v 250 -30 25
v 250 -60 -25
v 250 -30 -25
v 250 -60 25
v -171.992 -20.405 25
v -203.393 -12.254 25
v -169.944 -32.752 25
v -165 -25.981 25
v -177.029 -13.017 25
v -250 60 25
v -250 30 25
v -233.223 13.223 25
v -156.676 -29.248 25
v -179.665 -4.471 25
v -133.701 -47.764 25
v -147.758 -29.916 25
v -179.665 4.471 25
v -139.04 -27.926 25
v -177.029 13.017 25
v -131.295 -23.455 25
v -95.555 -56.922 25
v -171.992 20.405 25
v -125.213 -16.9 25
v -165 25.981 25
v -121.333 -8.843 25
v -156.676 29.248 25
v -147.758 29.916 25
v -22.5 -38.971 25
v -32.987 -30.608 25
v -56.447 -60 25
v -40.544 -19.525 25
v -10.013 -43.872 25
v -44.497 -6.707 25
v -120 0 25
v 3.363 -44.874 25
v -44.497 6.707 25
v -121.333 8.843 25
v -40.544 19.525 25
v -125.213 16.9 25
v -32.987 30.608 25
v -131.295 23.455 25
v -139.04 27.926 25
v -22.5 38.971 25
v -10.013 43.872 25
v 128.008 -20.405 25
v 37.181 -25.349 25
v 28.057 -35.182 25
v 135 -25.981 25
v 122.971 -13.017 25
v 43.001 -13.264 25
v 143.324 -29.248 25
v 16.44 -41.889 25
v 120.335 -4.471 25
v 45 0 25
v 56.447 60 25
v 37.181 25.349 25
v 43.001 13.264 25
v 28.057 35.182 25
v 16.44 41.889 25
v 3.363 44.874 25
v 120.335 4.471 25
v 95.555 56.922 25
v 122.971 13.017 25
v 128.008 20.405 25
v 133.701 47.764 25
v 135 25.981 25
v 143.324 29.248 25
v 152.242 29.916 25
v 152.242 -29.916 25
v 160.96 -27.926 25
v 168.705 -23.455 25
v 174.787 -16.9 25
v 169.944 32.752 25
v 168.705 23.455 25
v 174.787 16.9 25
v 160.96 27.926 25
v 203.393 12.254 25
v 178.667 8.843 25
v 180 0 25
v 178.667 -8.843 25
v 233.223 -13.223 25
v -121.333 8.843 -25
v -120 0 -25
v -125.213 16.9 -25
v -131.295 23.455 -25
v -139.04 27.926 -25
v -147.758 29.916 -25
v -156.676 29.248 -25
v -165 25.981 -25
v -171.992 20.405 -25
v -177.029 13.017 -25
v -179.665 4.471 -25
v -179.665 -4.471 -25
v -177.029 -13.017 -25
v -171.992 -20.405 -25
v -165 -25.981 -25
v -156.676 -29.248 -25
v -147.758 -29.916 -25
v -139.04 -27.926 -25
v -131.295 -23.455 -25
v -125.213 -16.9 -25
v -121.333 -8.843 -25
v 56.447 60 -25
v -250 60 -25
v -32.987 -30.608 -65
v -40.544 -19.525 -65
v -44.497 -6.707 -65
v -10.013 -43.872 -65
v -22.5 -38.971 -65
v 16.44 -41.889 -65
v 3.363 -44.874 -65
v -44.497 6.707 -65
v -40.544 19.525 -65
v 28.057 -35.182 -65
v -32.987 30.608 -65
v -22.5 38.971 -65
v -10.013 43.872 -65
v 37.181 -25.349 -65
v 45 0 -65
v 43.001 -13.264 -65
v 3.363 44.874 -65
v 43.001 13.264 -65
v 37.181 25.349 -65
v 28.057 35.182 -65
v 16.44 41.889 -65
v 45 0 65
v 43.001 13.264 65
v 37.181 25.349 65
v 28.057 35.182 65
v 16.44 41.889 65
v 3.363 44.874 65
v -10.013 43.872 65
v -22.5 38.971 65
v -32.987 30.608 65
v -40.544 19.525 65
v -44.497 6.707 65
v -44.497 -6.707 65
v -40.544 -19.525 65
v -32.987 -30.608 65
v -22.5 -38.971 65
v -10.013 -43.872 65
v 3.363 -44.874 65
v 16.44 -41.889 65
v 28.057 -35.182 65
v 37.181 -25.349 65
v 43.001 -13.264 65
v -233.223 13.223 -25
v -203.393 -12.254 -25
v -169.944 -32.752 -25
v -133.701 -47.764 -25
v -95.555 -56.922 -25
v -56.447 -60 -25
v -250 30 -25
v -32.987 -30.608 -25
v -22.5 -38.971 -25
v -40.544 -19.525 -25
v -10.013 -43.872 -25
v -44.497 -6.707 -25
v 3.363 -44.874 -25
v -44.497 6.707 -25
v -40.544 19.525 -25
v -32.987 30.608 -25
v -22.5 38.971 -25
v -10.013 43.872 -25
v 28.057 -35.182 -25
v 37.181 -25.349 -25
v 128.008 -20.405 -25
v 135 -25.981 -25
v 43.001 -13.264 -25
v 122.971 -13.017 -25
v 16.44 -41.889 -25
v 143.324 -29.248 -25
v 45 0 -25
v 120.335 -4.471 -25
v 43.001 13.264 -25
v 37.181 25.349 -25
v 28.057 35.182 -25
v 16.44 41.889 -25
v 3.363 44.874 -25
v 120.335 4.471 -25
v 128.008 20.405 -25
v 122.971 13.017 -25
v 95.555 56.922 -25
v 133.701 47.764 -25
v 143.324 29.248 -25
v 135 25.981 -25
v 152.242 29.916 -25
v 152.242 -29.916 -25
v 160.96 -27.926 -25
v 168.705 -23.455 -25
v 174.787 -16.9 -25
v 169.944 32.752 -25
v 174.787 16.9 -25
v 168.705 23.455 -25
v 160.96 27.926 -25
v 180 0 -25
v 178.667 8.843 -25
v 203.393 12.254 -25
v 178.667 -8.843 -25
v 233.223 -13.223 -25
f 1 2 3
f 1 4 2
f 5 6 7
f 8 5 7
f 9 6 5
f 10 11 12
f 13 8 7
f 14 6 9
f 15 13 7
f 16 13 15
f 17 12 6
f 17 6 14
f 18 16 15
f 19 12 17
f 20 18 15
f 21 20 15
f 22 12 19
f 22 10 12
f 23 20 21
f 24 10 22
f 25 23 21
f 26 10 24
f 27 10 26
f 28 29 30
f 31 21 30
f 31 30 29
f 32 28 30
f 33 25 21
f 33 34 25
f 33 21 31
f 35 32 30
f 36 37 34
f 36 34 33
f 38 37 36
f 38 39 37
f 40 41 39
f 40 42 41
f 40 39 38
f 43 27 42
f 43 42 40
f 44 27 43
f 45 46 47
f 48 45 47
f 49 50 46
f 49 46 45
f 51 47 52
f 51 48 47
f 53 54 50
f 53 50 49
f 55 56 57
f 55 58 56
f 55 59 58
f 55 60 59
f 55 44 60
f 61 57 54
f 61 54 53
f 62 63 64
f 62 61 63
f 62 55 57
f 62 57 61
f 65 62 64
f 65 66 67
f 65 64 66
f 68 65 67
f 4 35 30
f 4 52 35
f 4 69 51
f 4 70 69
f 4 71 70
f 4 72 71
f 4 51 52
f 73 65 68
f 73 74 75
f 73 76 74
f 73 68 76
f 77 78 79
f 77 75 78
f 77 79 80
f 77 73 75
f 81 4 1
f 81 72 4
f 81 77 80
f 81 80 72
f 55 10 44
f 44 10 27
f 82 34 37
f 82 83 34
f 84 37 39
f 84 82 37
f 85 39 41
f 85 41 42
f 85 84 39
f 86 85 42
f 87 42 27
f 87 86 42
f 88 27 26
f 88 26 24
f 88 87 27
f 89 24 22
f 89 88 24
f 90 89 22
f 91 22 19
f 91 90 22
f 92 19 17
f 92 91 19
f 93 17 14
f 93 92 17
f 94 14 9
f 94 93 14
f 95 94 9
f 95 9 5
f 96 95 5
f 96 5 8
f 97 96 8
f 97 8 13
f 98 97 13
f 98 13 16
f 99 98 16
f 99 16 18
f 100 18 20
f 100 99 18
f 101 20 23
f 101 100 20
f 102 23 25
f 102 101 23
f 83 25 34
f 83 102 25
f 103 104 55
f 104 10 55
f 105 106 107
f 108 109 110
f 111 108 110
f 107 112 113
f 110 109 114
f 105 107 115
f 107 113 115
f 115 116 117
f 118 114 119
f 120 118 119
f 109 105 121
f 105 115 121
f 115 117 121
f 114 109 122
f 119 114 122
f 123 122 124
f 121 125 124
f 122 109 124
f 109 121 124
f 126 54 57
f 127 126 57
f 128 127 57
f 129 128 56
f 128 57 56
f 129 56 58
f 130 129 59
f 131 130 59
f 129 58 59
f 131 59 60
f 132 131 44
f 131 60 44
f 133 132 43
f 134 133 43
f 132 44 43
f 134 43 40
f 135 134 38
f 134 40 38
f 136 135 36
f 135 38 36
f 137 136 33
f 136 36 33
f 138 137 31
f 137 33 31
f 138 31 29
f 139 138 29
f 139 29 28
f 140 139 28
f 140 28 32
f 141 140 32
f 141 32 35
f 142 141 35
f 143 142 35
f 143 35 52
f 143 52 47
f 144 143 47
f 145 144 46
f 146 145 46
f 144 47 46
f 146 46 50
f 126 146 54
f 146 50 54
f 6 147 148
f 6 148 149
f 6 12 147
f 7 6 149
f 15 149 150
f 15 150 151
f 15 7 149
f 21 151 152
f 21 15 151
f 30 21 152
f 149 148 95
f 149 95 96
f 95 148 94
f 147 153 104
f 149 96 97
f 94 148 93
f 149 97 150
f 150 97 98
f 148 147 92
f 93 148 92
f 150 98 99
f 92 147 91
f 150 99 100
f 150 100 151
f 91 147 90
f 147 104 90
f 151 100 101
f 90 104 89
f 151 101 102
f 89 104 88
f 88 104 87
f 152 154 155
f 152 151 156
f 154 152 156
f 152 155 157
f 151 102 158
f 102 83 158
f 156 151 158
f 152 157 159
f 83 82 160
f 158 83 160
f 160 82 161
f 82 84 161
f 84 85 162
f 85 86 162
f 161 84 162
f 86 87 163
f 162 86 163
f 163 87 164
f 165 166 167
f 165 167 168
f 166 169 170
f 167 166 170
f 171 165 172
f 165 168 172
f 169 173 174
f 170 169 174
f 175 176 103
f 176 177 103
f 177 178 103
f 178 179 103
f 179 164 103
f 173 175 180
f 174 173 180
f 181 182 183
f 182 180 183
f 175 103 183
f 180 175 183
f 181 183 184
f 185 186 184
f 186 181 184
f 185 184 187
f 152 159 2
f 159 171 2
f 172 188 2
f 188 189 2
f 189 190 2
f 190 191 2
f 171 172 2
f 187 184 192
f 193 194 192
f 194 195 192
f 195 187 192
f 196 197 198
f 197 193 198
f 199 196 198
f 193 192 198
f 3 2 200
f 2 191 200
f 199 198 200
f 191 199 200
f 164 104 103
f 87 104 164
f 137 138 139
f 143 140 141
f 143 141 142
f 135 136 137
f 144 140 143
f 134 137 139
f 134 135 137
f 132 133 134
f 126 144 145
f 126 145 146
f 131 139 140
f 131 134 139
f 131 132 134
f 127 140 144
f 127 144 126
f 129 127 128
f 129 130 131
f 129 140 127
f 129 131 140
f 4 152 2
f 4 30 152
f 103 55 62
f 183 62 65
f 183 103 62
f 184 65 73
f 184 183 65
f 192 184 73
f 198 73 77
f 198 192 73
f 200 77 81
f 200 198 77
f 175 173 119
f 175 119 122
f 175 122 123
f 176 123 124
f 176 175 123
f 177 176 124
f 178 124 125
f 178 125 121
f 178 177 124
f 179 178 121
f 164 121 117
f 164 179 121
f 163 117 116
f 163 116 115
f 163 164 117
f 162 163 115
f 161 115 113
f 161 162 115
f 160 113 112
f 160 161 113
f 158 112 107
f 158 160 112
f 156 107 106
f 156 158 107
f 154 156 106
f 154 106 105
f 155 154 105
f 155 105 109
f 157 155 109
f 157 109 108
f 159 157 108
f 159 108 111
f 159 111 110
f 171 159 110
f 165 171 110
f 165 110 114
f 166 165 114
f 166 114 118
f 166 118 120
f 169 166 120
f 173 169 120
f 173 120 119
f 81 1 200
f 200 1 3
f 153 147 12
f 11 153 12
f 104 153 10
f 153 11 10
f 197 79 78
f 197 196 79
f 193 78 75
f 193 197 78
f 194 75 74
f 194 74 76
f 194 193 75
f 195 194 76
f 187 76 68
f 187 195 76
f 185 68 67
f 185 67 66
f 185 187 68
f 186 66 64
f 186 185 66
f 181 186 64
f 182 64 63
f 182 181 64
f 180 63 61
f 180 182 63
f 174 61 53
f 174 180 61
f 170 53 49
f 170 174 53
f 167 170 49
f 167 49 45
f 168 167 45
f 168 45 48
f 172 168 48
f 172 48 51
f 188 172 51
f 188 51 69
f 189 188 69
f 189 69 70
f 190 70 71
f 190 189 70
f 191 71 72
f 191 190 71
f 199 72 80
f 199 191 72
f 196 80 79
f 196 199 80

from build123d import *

# Parameters (mm, degrees)
F0_W          = 500
F0_H          = 120
F0_R          = 30
F1_DEPTH      = 25
F2_R          = 45
F3_DEPTH      = 40
F3_DEPTH_BACK = 90
F4_SIZE       = 90
F5_R          = 250


with BuildPart() as f1:
    # F0 (on Top) → F1 (new body, symmetric)
    with BuildSketch(Plane.XY):
        Rectangle(F0_W, F0_H)
        with Locations((-150, 0)):
            Circle(F0_R, mode=Mode.SUBTRACT)
        with Locations((150, 0)):
            Circle(F0_R, mode=Mode.SUBTRACT)
    extrude(amount=F1_DEPTH, both=True)

    # F2 (on face) → F3 (join, two sides)
    with BuildSketch(Plane.XY.offset(25)) as f3_sk:
        Circle(F2_R)
    extrude(amount=F3_DEPTH)
    extrude(f3_sk.sketch, amount=-F3_DEPTH_BACK)

    # F4
    f4_edges = [f1.edges().sort_by_distance(p)[0] for p in [
        (-250, -60, 0),
        (250, 60, 0),
    ]]
    chamfer(f4_edges, length=F4_SIZE)

    # F5
    f5_edges = [f1.edges().sort_by_distance(p)[0] for p in [
        (-160, -60, 0),
        (160, 60, 0),
    ]]
    fillet(f5_edges, radius=F5_R)


solid = f1.part
